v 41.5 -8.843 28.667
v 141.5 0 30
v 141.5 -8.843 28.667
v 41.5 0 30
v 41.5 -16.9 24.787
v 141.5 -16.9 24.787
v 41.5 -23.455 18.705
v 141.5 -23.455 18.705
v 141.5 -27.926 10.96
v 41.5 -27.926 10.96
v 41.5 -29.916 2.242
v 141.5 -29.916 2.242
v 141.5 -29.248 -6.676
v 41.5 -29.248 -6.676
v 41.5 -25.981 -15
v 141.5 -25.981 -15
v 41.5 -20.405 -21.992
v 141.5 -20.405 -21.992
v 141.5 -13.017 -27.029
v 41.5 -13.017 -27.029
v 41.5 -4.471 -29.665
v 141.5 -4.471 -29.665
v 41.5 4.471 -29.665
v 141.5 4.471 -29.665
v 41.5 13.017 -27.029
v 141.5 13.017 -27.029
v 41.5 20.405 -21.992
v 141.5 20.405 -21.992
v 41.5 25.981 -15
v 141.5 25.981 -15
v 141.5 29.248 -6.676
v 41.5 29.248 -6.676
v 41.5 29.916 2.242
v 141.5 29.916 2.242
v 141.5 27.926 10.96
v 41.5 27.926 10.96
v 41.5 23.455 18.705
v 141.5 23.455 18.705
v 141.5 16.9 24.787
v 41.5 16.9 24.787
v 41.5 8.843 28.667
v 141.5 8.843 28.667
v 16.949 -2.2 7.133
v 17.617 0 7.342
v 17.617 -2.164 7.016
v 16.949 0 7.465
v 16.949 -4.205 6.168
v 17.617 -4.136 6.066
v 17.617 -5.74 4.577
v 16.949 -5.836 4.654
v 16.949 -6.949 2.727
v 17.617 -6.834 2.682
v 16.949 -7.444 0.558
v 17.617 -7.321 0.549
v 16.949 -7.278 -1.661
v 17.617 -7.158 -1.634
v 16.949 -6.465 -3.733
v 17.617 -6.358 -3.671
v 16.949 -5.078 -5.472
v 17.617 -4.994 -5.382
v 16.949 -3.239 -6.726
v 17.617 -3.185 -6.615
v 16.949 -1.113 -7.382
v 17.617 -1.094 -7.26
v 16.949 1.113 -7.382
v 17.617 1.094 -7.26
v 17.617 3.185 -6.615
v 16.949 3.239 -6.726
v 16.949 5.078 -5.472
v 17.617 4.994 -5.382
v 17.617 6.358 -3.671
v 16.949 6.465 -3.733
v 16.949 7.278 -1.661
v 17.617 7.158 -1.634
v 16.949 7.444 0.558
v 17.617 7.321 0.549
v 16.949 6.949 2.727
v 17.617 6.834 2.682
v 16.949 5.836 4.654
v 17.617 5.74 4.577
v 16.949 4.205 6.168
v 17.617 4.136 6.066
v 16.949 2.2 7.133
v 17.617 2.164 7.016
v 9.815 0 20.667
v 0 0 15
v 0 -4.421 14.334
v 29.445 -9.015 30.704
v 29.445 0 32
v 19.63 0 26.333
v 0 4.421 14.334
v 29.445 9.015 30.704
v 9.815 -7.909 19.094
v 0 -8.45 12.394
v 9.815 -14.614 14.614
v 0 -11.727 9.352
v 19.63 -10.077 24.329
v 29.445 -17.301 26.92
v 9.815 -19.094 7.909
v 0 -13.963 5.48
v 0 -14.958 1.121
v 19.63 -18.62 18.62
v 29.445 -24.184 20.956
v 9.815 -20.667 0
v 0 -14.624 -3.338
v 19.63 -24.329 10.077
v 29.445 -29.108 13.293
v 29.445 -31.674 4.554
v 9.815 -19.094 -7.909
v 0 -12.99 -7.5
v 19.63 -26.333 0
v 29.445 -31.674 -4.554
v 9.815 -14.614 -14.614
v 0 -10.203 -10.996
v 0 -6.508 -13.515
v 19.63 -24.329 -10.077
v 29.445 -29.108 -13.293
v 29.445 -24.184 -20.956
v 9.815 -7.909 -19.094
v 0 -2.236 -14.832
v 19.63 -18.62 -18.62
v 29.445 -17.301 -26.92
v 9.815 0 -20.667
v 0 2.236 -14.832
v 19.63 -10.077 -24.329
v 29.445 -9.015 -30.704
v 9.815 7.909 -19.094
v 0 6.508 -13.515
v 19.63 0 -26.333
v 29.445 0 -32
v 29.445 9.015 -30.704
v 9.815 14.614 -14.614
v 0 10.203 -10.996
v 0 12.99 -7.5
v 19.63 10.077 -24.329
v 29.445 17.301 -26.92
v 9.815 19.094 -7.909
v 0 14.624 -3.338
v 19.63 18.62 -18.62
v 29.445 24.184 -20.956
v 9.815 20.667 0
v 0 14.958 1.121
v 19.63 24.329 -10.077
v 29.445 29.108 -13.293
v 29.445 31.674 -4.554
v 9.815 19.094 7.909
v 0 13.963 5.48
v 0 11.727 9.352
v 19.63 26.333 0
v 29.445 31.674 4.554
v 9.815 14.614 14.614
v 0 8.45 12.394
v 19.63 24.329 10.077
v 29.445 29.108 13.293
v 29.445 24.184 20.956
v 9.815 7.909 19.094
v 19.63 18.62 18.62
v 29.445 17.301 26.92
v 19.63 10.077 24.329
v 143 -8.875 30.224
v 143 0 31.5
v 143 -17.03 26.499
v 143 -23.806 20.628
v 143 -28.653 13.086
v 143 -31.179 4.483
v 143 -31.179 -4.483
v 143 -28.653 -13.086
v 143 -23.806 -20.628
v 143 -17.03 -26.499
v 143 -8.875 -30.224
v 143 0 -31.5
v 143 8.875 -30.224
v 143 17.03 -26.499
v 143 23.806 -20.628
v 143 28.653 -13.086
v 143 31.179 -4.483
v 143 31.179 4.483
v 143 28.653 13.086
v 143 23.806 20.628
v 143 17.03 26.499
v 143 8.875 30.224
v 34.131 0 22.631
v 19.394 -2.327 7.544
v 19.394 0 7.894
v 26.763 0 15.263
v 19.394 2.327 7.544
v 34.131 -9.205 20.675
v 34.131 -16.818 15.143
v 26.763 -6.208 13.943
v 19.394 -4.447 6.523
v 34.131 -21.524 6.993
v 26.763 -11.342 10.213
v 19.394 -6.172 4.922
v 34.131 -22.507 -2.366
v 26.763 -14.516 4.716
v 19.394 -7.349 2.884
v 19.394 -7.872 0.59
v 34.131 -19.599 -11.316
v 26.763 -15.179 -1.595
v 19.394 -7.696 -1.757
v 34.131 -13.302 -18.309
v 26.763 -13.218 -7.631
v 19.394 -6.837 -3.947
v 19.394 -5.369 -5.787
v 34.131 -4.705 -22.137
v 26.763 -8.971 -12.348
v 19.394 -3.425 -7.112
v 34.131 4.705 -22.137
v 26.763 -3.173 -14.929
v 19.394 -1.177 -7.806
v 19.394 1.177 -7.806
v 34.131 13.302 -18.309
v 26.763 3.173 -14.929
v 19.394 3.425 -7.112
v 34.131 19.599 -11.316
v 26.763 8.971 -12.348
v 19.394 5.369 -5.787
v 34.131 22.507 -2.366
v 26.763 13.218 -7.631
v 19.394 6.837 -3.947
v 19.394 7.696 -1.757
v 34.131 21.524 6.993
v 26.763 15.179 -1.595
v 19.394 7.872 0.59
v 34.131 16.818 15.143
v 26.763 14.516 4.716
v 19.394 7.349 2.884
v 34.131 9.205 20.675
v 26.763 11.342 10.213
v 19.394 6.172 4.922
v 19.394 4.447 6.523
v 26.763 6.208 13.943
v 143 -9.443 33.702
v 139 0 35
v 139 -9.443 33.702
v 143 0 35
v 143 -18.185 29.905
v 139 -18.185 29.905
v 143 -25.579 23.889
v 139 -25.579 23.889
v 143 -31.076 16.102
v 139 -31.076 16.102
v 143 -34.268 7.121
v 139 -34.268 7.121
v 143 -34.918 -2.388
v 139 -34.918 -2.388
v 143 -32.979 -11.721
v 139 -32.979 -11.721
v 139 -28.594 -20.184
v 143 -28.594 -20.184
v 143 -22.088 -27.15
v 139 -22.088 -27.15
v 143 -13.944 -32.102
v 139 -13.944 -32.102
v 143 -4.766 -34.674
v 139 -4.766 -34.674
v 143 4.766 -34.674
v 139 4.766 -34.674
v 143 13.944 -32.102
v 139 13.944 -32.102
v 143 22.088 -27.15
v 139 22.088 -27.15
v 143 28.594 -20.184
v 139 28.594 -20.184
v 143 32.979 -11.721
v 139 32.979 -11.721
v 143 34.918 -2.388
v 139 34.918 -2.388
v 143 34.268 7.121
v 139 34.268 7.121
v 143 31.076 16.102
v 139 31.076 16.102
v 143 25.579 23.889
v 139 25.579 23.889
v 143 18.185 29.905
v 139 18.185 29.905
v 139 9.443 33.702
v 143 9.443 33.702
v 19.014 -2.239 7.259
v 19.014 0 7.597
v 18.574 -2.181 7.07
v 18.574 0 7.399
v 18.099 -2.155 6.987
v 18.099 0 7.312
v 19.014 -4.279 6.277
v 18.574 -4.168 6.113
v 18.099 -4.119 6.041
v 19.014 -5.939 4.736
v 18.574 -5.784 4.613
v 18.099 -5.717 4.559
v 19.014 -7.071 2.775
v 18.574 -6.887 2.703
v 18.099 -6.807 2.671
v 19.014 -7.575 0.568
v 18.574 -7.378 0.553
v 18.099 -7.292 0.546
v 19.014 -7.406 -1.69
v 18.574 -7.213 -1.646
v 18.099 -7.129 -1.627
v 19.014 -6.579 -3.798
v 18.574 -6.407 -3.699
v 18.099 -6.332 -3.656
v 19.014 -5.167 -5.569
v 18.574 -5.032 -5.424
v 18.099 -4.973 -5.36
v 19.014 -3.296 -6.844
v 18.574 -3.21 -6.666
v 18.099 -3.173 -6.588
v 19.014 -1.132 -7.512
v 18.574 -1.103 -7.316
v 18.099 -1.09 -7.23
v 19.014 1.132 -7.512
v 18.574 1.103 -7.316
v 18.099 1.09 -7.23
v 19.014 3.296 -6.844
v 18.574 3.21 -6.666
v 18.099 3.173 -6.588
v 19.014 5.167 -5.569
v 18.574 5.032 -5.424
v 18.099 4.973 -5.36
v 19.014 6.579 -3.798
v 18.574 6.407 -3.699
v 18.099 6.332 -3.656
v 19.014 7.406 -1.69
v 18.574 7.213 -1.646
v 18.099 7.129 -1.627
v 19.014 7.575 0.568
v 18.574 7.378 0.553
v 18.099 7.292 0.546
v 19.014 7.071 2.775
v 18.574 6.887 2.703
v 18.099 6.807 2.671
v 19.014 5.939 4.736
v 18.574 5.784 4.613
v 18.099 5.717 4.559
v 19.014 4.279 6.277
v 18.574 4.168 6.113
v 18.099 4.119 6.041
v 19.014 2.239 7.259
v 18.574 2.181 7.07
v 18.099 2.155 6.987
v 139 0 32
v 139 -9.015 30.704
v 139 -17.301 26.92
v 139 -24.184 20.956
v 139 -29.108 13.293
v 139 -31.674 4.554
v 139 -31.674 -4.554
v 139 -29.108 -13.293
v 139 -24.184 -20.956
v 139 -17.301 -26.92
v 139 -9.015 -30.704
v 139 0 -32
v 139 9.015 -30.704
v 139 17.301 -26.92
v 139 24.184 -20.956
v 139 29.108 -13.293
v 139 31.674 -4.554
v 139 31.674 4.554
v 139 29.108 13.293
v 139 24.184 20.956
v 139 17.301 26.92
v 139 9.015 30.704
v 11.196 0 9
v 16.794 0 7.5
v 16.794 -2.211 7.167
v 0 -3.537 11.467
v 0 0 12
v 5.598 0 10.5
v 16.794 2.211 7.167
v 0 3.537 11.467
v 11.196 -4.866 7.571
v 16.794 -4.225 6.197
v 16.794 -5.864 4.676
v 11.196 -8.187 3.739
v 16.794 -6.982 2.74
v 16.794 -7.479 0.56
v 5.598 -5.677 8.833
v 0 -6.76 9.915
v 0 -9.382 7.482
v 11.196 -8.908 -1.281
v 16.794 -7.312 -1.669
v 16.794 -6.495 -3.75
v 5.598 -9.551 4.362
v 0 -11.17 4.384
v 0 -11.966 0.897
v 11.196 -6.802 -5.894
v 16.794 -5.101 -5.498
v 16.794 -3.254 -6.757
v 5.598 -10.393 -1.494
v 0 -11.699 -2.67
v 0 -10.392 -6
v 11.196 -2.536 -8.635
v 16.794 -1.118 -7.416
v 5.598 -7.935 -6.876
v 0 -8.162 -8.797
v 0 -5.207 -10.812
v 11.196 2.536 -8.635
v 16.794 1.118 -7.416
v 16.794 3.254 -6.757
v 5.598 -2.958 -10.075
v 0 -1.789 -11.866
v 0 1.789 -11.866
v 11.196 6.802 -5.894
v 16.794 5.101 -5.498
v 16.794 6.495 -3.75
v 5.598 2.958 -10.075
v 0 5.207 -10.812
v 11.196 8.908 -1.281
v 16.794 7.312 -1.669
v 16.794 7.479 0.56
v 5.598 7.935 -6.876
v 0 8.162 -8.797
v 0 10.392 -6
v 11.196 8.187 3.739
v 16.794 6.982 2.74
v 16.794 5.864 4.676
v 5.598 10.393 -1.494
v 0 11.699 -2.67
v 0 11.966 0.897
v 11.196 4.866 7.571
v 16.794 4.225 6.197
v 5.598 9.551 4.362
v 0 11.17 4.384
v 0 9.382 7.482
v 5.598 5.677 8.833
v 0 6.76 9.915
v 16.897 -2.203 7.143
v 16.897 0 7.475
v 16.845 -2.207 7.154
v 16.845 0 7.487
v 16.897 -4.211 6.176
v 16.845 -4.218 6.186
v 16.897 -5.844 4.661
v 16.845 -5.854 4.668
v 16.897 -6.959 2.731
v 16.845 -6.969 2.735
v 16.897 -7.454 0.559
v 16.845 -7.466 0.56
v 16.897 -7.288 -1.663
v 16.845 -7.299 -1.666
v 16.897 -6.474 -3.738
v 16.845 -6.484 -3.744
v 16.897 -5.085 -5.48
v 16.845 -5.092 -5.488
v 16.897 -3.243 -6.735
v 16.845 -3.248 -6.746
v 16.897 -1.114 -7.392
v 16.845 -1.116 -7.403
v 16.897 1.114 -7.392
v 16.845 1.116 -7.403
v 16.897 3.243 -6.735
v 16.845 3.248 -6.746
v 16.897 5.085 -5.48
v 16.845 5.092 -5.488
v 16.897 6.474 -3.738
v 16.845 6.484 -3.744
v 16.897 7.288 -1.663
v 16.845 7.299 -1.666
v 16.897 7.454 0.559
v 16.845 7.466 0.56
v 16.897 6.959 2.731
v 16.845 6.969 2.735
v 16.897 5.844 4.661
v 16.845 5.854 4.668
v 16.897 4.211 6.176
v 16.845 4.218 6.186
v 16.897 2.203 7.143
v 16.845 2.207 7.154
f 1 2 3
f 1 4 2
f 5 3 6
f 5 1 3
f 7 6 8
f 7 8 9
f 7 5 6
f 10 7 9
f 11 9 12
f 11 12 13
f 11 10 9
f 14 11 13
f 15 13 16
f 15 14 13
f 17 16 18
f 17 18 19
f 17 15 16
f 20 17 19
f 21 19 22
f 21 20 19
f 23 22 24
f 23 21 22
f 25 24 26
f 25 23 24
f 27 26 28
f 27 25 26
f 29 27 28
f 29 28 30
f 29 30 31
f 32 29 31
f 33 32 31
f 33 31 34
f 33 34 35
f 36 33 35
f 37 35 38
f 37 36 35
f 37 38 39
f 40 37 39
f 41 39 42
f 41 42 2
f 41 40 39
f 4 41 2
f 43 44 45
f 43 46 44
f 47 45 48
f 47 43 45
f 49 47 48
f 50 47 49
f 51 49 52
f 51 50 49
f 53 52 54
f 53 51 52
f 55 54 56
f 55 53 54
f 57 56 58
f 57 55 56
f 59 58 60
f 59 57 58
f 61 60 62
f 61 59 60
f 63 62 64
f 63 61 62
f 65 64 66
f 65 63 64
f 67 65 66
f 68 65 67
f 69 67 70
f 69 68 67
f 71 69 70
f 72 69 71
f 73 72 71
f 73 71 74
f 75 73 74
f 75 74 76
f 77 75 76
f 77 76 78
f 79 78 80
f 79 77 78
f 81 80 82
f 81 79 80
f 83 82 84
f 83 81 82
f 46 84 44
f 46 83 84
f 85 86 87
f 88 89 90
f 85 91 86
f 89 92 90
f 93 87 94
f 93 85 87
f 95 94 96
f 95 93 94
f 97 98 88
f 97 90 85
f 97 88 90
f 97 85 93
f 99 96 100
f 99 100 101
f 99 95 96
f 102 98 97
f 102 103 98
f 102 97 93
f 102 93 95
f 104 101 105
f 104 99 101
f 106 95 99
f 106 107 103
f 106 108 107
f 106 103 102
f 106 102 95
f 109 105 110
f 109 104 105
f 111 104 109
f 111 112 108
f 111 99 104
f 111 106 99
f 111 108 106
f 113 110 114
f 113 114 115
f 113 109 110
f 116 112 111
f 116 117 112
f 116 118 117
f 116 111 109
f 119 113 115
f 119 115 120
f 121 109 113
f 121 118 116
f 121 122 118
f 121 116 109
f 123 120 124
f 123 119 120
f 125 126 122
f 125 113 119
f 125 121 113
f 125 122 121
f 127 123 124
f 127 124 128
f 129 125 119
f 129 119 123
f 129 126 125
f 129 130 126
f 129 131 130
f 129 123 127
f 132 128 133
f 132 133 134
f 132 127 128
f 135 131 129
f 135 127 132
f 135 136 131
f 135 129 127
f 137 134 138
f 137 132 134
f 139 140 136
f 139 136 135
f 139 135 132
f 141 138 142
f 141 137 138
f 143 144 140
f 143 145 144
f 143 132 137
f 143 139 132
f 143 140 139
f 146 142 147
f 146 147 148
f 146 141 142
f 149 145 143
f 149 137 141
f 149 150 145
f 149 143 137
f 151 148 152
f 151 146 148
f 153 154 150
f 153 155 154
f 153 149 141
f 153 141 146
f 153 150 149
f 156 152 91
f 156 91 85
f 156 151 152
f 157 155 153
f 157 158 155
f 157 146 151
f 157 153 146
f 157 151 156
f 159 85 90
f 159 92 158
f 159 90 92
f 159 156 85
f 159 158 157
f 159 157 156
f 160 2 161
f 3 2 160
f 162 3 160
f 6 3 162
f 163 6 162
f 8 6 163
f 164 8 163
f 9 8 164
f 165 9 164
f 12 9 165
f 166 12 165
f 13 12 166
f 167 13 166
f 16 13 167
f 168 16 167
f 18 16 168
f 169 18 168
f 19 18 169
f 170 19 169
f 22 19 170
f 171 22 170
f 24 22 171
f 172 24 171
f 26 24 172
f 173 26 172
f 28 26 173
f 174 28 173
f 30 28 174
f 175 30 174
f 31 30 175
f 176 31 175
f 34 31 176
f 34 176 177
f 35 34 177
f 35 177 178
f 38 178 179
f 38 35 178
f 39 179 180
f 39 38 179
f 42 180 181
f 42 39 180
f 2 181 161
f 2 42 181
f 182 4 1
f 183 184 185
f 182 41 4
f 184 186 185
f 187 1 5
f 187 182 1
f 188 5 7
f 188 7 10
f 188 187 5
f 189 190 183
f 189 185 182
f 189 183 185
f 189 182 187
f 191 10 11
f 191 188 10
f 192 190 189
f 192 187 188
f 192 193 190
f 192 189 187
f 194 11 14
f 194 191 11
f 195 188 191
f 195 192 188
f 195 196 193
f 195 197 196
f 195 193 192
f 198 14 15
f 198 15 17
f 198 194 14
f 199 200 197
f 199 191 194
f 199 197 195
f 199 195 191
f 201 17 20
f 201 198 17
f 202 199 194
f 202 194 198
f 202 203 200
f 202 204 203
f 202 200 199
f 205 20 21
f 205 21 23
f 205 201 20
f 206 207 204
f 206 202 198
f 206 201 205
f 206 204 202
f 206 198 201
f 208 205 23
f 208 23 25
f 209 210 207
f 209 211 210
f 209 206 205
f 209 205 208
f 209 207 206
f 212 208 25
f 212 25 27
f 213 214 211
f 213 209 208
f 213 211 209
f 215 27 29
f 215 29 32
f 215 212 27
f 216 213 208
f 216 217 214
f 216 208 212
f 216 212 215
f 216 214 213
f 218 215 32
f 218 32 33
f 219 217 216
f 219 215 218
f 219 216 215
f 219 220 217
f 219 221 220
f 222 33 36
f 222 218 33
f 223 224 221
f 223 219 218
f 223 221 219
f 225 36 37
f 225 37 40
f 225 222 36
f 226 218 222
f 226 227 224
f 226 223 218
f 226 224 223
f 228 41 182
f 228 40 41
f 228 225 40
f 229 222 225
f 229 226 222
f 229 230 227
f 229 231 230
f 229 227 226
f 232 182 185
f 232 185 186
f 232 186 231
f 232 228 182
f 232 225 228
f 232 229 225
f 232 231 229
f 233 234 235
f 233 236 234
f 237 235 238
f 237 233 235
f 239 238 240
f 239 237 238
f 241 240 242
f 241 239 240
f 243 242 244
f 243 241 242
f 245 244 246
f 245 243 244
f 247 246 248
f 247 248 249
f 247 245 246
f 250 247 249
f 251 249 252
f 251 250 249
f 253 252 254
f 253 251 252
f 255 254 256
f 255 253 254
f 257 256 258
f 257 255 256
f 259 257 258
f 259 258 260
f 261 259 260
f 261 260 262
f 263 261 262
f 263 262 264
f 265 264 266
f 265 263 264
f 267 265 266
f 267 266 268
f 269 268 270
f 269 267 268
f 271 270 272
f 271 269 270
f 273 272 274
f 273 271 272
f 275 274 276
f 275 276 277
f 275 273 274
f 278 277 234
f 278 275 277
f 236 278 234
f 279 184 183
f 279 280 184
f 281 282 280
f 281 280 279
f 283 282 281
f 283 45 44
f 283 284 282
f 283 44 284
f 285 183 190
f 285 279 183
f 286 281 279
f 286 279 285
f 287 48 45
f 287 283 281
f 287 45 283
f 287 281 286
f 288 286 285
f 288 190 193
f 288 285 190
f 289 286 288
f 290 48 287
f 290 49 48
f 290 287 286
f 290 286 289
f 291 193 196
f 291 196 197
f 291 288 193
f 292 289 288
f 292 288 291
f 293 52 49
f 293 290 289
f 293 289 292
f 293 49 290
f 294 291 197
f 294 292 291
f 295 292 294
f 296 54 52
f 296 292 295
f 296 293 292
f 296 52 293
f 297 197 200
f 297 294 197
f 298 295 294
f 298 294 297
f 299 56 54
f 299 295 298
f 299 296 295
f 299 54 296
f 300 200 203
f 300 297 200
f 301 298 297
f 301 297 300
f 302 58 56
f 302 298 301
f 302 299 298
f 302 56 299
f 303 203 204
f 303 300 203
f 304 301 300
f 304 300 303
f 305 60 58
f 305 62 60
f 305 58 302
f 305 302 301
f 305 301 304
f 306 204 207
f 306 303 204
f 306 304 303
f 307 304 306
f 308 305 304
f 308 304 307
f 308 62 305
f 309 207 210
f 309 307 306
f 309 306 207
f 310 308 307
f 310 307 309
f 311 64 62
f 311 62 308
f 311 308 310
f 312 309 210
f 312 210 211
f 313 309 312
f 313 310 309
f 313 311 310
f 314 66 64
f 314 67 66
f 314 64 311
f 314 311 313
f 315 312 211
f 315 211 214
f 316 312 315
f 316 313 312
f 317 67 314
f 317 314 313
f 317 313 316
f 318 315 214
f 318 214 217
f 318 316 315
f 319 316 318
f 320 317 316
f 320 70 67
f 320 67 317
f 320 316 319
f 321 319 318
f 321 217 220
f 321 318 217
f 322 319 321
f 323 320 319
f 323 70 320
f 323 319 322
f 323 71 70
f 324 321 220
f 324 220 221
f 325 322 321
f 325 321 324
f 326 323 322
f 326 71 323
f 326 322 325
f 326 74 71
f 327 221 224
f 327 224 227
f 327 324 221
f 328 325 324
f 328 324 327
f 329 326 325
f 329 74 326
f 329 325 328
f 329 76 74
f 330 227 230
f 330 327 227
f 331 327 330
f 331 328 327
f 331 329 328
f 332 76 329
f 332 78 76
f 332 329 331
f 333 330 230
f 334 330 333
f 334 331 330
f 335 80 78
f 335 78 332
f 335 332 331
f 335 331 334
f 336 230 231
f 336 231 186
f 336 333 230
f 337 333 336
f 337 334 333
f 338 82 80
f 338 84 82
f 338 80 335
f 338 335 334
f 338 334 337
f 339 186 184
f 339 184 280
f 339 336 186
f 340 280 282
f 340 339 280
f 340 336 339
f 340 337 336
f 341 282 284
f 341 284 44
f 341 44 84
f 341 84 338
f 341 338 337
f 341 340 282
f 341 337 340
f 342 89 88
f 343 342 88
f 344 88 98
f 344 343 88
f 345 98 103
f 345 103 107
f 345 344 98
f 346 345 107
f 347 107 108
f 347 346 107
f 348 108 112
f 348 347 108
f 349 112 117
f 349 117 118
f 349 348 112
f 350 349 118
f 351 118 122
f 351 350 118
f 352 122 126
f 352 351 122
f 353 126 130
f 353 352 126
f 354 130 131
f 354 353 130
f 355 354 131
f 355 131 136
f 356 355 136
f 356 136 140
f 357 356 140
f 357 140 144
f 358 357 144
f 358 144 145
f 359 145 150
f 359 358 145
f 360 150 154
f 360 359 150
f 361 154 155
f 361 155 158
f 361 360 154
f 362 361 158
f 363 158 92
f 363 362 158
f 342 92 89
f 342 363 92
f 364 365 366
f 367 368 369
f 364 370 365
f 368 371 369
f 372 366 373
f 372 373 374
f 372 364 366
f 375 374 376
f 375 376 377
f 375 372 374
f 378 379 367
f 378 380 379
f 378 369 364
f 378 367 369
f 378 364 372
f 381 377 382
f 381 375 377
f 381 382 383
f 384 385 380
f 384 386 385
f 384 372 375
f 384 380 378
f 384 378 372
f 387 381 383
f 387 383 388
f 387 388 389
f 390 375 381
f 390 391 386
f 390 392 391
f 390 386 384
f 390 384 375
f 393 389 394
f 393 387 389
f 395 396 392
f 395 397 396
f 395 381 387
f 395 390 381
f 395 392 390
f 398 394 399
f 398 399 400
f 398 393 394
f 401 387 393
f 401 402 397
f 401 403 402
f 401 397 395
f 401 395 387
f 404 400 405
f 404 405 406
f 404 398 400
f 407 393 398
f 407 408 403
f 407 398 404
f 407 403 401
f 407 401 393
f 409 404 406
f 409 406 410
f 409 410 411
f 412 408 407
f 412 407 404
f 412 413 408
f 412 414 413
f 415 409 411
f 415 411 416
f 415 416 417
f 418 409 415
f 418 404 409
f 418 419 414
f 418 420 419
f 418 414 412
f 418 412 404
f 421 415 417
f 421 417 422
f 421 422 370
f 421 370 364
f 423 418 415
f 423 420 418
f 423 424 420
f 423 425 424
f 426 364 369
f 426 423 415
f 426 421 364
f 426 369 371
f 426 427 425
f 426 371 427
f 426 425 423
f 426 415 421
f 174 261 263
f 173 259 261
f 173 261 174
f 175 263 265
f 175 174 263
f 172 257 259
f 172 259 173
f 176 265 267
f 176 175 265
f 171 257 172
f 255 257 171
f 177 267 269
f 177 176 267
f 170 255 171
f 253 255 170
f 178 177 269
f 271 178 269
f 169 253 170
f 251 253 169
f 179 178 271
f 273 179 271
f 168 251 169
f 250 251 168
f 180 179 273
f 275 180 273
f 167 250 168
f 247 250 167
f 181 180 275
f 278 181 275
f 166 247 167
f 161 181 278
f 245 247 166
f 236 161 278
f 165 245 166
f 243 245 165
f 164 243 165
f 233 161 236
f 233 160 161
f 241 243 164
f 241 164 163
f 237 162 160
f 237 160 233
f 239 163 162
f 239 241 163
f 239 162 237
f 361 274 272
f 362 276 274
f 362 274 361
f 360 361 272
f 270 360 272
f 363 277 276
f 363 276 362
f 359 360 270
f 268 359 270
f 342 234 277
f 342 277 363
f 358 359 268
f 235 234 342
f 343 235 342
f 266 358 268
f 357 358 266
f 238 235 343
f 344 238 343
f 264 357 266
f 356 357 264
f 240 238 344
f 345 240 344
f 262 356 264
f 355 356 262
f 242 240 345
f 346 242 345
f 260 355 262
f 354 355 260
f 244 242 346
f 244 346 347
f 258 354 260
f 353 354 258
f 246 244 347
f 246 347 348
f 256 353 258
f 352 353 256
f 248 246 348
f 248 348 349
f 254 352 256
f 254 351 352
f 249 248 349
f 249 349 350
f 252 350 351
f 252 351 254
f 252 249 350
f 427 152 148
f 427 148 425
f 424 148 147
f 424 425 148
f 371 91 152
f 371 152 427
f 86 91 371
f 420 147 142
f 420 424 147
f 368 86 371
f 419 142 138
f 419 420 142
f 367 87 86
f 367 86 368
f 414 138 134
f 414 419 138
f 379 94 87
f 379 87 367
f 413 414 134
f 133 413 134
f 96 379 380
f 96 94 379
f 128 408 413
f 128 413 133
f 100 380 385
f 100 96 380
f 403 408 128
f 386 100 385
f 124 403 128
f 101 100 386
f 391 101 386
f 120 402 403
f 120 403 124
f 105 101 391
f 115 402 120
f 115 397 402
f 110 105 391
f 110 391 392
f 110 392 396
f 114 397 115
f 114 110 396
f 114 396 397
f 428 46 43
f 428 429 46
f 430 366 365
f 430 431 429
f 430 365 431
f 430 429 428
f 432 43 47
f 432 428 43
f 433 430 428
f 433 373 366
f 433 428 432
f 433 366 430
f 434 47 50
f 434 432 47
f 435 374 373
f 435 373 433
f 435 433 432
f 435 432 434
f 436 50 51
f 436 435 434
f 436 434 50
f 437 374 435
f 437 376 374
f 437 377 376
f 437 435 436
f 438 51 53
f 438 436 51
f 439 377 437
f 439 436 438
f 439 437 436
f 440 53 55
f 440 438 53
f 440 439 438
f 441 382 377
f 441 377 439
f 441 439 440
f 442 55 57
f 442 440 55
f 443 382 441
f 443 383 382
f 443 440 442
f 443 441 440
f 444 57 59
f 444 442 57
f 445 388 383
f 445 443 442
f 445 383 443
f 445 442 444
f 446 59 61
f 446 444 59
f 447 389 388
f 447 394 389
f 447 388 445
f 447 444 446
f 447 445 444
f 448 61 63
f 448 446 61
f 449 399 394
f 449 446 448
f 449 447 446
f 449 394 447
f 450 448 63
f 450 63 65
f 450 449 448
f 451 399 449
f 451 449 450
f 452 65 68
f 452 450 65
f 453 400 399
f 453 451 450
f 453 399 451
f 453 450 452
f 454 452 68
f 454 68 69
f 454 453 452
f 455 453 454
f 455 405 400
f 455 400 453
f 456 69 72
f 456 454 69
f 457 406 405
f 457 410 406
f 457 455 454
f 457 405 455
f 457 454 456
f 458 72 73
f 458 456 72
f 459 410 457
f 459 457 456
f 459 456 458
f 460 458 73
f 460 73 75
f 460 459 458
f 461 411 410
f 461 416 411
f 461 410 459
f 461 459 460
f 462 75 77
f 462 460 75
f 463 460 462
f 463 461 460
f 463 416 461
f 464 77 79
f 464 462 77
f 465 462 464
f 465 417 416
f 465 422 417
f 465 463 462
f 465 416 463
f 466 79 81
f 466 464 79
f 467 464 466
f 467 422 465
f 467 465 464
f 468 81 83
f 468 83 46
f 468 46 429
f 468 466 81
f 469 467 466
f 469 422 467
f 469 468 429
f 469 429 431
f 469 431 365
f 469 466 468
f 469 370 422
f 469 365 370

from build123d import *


with BuildPart() as part:
    # Эскиз1 → Повернуть1 (revolve)
    with BuildSketch(Plane.XY, mode=Mode.PRIVATE) as revolve_1_sk:
        with BuildLine():
            Line((0, 15), (29.444863729, 32))
            Line((29.444863729, 32), (139, 32))
            Line((139, 32), (139, 35))
            Line((139, 35), (143, 35))
            Line((143, 35), (143, 31.5))
            Line((143, 31.5), (141.5, 30))
            Line((141.5, 30), (41.5, 30))
            Line((41.5, 30), (19.394228634, 7.894228634))
            ThreePointArc((19.394228634, 7.894228634), (18.573684899, 7.398584574), (17.616752191, 7.341708844))
            Line((17.616752191, 7.341708844), (16.948603844, 7.4651183))
            ThreePointArc((16.948603844, 7.4651183), (16.871071065, 7.481031521), (16.794228634, 7.5))
            Line((16.794228634, 7.5), (0, 12))
            Line((0, 12), (0, 15))
        make_face()
    revolve(revolve_1_sk.sketch.rotate(Axis((0, 0, 0), (1, 0, 0)), 90), axis=Axis((0, 0, 0), (1, 0, 0)))


solid = part.part
